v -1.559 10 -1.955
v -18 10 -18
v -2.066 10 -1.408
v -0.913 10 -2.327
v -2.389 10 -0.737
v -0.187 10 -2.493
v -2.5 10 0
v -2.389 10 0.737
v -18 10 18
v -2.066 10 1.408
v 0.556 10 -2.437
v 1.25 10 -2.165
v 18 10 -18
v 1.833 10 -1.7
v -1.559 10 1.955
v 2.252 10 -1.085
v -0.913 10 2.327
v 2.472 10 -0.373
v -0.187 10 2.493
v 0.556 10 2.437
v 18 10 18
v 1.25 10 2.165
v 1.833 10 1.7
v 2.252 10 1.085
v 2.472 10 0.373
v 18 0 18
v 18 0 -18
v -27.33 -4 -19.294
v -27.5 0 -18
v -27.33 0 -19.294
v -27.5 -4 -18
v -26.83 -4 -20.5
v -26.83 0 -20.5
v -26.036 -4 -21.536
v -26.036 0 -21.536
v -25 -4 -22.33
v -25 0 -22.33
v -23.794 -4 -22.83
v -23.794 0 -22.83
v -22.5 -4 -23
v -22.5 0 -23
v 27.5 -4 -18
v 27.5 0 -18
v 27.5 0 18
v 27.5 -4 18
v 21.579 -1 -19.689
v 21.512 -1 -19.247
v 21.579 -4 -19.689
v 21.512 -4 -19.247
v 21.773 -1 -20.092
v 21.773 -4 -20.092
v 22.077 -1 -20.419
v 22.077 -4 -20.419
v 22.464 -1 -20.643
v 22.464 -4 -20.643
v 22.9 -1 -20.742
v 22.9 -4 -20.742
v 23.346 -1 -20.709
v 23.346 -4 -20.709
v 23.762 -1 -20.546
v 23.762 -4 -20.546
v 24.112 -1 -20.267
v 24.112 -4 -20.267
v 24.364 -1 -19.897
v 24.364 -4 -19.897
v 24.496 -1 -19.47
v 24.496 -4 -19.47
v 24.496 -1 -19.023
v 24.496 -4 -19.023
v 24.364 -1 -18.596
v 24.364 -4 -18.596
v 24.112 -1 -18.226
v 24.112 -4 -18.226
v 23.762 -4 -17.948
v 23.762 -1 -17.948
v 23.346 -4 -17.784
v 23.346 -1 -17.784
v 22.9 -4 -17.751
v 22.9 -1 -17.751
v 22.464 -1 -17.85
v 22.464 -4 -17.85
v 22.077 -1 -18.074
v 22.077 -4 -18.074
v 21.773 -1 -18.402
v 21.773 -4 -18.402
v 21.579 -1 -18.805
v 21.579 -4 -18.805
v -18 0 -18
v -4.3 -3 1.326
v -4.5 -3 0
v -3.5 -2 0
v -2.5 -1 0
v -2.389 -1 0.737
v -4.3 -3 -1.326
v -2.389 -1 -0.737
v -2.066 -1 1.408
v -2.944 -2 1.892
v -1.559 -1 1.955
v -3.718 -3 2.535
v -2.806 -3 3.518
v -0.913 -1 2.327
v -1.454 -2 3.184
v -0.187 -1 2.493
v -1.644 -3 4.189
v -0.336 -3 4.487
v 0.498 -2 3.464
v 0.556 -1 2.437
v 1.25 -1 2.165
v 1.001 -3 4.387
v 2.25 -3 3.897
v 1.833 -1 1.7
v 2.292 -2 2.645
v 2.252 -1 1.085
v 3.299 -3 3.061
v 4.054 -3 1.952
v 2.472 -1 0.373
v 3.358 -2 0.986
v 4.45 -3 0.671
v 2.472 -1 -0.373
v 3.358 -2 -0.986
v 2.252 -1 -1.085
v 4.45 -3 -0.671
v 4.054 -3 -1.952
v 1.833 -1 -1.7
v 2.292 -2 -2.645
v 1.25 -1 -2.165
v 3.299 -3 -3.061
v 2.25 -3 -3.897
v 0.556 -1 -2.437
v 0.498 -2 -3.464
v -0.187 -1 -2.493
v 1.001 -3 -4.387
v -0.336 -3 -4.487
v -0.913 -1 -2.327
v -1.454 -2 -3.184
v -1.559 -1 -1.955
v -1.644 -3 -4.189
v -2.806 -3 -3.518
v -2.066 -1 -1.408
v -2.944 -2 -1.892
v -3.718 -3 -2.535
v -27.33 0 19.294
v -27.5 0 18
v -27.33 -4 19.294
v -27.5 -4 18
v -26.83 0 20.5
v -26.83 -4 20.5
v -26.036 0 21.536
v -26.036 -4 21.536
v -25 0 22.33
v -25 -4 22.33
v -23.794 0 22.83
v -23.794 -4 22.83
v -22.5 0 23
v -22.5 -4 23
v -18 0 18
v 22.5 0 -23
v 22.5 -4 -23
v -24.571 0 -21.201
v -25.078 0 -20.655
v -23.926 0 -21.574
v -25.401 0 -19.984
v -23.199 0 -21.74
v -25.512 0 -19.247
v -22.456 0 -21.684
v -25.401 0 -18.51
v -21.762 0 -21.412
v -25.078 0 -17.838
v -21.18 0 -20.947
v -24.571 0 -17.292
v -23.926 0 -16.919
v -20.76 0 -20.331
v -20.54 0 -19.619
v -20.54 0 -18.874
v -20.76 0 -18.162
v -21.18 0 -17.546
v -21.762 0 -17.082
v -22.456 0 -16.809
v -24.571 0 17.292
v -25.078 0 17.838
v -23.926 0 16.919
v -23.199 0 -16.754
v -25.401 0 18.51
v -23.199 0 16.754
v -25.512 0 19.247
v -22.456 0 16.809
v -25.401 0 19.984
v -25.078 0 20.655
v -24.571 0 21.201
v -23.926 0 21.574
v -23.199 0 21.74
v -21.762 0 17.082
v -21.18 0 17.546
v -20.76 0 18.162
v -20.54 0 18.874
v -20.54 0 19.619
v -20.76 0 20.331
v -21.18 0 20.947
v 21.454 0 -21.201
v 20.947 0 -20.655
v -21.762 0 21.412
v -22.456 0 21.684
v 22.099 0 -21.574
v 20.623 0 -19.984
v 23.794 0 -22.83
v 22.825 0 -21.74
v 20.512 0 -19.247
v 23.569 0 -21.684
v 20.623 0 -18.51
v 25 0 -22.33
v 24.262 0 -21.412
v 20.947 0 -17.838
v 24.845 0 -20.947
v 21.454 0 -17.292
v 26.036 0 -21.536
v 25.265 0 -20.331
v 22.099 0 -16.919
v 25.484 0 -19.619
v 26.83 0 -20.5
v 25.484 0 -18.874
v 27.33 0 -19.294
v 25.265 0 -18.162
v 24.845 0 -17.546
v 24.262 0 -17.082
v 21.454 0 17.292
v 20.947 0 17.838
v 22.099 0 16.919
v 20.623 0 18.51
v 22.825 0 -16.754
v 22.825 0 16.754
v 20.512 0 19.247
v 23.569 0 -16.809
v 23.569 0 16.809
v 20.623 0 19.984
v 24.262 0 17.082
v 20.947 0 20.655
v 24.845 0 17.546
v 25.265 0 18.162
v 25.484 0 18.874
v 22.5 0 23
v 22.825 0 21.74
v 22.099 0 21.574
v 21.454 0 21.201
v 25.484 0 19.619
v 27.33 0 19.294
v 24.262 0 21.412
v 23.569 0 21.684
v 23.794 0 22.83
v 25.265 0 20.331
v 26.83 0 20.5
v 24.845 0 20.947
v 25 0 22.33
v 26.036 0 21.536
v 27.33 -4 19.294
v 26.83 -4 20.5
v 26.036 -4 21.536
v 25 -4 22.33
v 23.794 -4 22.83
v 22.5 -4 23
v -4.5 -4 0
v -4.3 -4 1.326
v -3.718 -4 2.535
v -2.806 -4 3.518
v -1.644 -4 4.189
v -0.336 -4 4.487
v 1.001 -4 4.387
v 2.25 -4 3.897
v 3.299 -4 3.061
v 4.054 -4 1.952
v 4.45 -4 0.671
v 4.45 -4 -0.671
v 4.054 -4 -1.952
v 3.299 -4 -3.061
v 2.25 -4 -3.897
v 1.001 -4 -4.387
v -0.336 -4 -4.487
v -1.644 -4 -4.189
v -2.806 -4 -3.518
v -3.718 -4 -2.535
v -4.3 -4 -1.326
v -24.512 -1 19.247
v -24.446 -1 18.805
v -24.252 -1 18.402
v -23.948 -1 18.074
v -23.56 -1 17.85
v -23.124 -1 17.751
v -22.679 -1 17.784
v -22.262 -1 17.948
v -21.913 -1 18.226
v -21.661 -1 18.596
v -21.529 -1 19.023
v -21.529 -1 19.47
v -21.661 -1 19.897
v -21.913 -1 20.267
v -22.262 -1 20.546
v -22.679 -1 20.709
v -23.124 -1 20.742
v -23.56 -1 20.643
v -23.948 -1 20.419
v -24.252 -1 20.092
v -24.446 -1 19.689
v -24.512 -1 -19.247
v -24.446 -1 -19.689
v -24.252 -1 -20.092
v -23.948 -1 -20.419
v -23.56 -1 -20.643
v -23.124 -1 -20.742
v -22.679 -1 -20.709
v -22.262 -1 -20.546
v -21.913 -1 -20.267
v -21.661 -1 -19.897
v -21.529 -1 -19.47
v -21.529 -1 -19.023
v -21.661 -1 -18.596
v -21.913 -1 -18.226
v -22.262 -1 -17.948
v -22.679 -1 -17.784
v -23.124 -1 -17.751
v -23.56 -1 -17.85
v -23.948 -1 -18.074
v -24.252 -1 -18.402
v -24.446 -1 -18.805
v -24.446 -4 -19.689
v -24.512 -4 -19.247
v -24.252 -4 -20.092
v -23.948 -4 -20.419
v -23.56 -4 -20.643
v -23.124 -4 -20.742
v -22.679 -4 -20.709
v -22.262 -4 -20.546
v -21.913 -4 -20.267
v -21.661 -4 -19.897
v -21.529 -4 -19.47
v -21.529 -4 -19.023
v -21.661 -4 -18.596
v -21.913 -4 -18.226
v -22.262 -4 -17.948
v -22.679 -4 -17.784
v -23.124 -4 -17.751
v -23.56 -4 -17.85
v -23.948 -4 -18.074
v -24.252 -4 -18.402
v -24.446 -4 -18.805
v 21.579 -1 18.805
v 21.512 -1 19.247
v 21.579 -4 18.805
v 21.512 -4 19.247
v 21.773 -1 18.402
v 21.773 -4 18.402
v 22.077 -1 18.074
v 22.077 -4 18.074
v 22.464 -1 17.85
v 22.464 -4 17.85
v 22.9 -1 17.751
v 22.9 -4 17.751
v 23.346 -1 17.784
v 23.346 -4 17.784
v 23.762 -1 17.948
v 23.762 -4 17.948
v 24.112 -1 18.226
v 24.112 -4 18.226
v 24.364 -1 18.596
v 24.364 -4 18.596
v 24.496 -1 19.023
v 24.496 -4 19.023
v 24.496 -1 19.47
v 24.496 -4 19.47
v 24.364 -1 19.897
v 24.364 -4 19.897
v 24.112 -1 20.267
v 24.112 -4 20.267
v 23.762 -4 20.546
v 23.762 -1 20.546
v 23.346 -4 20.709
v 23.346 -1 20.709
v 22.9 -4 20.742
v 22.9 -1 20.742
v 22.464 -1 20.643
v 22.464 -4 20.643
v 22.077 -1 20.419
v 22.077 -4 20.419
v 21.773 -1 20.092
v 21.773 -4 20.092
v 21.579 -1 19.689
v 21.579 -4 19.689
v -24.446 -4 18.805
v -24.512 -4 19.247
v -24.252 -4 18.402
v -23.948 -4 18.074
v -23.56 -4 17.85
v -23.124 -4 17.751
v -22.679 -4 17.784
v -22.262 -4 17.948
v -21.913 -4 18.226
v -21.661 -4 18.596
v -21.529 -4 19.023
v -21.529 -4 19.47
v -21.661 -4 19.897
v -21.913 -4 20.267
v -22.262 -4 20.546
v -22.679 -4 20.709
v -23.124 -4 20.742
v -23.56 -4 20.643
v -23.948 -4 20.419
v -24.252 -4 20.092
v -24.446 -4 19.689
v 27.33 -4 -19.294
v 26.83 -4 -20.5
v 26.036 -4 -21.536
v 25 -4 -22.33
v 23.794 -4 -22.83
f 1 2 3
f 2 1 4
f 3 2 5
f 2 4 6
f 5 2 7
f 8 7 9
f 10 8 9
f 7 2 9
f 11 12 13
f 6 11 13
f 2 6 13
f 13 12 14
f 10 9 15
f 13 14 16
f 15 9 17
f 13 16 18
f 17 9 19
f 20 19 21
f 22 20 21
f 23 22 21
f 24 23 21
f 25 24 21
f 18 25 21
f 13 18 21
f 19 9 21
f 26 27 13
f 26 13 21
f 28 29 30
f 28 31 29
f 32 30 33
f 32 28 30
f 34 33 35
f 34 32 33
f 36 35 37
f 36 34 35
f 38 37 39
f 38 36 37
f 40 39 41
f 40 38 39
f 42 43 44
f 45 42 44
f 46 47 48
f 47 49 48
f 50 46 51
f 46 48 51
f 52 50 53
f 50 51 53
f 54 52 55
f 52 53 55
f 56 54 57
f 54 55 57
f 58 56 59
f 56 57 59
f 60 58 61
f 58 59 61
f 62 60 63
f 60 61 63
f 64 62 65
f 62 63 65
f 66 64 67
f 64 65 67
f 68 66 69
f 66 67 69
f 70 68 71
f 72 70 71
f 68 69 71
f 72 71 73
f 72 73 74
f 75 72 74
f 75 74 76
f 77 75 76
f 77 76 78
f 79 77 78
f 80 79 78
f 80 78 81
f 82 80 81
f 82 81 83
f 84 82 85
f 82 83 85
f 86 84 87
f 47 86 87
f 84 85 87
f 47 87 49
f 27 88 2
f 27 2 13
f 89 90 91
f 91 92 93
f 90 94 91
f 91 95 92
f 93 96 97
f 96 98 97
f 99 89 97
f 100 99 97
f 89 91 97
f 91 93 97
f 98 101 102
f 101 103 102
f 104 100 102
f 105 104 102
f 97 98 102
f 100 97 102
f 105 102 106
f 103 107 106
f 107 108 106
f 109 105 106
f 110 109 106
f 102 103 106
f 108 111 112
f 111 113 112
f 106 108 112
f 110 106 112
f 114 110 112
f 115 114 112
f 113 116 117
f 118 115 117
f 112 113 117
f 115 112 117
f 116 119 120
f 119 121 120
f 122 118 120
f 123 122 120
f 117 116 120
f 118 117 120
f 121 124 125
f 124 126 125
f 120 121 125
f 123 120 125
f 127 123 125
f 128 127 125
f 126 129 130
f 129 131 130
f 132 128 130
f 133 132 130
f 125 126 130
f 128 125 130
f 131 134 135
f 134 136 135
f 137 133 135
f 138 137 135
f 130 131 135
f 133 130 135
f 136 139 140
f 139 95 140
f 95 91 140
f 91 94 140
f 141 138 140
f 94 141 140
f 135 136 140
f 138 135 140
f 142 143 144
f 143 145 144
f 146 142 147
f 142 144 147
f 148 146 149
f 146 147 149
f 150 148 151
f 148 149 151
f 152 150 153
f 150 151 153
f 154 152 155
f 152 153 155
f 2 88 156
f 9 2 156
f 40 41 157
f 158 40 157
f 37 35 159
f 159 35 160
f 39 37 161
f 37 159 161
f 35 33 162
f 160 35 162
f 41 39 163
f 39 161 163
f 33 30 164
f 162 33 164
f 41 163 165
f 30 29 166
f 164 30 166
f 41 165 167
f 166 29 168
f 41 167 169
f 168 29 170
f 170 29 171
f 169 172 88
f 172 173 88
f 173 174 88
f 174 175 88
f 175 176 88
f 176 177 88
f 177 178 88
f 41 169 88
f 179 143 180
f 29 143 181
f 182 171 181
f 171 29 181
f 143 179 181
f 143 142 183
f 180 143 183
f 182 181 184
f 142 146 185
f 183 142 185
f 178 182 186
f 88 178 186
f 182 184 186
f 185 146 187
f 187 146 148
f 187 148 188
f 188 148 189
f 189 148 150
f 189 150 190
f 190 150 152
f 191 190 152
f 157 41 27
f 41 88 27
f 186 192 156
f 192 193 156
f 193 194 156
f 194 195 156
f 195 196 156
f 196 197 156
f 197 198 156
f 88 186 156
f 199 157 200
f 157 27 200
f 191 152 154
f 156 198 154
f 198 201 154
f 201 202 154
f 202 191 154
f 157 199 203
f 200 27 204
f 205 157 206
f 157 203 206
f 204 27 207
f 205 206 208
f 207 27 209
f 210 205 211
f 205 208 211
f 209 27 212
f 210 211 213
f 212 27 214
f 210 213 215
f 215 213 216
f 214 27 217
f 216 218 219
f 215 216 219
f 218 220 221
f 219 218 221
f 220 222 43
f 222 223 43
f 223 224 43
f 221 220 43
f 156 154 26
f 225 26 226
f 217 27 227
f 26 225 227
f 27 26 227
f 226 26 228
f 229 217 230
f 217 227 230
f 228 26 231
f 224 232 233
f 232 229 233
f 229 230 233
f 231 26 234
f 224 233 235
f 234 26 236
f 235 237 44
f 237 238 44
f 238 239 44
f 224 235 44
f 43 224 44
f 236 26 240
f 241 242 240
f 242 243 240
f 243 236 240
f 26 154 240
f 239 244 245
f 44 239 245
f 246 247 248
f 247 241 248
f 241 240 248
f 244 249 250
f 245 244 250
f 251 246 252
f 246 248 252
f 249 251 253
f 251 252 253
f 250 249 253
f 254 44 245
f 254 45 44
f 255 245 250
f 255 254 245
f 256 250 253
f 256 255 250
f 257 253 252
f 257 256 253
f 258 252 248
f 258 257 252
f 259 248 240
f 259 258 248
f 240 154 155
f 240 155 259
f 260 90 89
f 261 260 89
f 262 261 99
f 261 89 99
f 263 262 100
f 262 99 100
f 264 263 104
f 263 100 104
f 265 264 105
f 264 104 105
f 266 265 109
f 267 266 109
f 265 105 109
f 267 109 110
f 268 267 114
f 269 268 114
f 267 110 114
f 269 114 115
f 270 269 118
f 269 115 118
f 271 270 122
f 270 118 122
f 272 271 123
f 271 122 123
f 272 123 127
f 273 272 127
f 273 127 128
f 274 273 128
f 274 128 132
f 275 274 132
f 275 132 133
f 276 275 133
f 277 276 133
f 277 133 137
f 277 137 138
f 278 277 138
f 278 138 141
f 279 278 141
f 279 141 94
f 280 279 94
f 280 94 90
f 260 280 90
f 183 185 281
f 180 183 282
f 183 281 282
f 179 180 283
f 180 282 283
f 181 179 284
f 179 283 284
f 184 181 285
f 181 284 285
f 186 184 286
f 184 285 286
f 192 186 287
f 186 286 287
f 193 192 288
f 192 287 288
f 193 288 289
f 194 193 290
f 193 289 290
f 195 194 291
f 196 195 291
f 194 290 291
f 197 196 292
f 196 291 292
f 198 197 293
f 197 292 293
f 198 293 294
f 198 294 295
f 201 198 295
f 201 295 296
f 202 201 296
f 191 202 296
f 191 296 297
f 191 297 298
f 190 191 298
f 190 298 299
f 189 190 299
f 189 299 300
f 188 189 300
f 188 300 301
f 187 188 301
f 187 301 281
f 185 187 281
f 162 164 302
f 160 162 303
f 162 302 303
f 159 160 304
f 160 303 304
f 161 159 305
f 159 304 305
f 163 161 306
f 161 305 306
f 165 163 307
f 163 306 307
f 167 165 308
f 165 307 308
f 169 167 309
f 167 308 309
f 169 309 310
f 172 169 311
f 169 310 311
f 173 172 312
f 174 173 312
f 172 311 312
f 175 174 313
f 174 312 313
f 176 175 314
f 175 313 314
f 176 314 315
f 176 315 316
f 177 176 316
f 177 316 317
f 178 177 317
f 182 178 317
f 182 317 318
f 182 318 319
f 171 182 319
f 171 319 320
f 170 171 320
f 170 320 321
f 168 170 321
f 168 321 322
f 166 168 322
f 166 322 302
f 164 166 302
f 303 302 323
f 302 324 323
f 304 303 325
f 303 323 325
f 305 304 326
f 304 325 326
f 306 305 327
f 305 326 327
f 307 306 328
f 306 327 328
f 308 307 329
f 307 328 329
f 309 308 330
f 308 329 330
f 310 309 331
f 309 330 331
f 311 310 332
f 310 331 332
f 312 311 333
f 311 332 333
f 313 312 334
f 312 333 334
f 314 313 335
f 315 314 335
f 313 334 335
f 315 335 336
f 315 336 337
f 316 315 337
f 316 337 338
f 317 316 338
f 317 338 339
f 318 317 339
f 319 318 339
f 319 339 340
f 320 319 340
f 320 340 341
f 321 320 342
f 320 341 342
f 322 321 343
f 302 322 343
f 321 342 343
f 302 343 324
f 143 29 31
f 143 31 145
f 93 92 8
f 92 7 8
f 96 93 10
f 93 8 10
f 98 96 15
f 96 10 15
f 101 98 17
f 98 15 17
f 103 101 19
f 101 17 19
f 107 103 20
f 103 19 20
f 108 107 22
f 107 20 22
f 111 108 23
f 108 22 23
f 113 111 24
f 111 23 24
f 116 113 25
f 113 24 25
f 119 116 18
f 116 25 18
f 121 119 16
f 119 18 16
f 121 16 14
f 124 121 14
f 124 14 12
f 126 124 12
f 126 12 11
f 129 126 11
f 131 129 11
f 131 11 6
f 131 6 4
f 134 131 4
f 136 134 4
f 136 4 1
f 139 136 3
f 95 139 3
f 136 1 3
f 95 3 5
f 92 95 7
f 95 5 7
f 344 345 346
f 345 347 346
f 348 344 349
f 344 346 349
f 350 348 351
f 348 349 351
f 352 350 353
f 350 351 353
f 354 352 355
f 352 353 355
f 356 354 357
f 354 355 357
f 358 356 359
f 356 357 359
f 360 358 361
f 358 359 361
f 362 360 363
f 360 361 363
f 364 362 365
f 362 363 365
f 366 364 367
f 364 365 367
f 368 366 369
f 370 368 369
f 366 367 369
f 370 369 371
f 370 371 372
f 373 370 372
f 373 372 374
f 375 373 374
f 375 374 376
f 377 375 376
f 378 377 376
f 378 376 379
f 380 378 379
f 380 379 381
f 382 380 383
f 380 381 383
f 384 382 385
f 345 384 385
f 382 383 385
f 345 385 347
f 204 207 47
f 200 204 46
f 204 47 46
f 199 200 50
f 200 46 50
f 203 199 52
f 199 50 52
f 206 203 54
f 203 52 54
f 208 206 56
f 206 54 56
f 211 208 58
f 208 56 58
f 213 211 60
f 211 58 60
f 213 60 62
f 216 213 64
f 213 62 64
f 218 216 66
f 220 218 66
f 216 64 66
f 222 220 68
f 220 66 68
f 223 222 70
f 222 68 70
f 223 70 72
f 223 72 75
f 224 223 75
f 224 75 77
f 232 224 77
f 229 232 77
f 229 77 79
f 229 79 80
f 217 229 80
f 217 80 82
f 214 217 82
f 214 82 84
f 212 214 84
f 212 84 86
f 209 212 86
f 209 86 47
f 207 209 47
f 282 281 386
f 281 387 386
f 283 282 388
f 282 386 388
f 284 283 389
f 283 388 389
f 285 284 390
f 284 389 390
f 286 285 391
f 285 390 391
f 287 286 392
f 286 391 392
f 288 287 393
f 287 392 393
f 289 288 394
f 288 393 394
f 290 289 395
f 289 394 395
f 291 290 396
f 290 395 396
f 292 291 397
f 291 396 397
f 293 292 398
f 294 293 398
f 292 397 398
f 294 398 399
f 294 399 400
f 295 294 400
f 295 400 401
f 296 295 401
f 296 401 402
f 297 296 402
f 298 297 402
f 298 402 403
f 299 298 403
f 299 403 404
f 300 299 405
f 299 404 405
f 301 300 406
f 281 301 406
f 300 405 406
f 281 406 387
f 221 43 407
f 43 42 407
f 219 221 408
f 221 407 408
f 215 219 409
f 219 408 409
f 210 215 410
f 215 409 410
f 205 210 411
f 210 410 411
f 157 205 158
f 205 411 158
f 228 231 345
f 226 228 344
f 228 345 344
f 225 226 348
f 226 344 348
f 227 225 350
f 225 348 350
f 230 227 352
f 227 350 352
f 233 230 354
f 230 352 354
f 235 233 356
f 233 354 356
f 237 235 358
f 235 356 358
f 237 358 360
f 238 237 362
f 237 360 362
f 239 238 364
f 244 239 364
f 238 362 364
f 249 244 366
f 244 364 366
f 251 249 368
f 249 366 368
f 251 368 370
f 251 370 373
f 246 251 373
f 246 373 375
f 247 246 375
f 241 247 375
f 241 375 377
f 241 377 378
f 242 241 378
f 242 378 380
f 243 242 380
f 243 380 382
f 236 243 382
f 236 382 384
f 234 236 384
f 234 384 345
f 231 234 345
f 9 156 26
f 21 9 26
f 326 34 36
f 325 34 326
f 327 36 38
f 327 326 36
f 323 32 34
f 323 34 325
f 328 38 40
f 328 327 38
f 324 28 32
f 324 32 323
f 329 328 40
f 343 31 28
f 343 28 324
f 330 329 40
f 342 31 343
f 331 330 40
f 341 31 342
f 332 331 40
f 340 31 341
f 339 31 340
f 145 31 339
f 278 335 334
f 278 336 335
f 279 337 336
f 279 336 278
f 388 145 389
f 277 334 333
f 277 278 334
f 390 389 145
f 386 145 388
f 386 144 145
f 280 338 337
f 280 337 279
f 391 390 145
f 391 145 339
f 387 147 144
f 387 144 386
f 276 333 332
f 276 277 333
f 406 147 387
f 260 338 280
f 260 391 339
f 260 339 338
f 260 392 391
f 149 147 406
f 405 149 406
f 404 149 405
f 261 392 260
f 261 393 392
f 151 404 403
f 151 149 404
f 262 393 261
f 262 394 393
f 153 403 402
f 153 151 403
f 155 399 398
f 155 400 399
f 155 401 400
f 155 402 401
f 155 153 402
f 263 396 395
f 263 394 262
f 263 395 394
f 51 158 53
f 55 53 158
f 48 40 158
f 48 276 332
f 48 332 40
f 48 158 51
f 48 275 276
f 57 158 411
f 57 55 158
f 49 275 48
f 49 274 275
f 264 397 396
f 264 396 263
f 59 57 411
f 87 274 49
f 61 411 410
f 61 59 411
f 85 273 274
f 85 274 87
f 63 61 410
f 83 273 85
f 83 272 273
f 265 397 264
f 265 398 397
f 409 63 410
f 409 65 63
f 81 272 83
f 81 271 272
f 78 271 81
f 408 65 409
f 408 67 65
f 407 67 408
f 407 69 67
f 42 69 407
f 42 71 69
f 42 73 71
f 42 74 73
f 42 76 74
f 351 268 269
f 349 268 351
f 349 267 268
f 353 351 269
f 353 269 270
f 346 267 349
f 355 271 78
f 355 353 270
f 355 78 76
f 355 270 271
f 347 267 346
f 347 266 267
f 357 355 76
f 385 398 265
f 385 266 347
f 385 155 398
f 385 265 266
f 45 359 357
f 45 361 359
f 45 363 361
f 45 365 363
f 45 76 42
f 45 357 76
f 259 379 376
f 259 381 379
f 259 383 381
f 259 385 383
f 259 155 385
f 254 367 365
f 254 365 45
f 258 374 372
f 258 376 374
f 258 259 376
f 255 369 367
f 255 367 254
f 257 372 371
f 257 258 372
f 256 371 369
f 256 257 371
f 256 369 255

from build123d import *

# Parameters (mm, degrees)
F0_W            = 55
F0_H            = 46
F0_W_2          = 36
F0_H_2          = 36
F1_DEPTH        = 4
F2_DEPTH        = 10
F3_D            = 5
F3_DEPTH        = 38
F8_D            = 9
F8_DEPTH        = 1
F9_D            = 5
F9_DEPTH        = 13
F9_CSINK_D      = 9
F9_CSINK_ANGLE  = 90
F10_D           = 3
F10_DEPTH       = 38
F10_CSINK_D     = 5
F10_CSINK_ANGLE = 90
F11_R           = 5


with BuildPart() as f1:
    # F0 (on Front) → F1 (new body)
    with BuildSketch(Plane.XZ):
        Rectangle(F0_W, F0_H)
        Rectangle(F0_W_2, F0_H_2, mode=Mode.SUBTRACT)
        Rectangle(F0_W_2, F0_H_2)
    extrude(amount=F1_DEPTH)

    # F0 (on Front) → F2 (join)
    with BuildSketch(Plane.XZ):
        Rectangle(F0_W_2, F0_H_2)
    extrude(amount=-F2_DEPTH)

    # F3
    with Locations(Plane.XZ):
        with Locations((0, 0)):
            Hole(F3_D / 2, depth=F3_DEPTH)

    # F8
    with Locations(Plane.XZ.offset(4)):
        with Locations((0, 0)):
            Hole(F8_D / 2, depth=F8_DEPTH)

    # F9
    with Locations(Plane.XZ.offset(3)):
        with Locations((0, 0)):
            CounterSinkHole(F9_D / 2, F9_CSINK_D / 2, depth=F9_DEPTH, counter_sink_angle=F9_CSINK_ANGLE)

    # F10
    with Locations(Plane(origin=(0, 0, 0), x_dir=(1, 0, 0), z_dir=(0, 1, 0))):
        with Locations((-23.012306, -19.246656), (23.012306, -19.246656), (23.012306, 19.246656), (-23.012306, 19.246656)):
            CounterSinkHole(F10_D / 2, F10_CSINK_D / 2, depth=F10_DEPTH, counter_sink_angle=F10_CSINK_ANGLE)

    # F11
    f11_edges = [f1.edges().sort_by_distance(p)[0] for p in [
        (-27.5, -2, 23),
        (27.5, -2, 23),
        (-27.5, -2, -23),
        (27.5, -2, -23),
    ]]
    fillet(f11_edges, radius=F11_R)


solid = f1.part
